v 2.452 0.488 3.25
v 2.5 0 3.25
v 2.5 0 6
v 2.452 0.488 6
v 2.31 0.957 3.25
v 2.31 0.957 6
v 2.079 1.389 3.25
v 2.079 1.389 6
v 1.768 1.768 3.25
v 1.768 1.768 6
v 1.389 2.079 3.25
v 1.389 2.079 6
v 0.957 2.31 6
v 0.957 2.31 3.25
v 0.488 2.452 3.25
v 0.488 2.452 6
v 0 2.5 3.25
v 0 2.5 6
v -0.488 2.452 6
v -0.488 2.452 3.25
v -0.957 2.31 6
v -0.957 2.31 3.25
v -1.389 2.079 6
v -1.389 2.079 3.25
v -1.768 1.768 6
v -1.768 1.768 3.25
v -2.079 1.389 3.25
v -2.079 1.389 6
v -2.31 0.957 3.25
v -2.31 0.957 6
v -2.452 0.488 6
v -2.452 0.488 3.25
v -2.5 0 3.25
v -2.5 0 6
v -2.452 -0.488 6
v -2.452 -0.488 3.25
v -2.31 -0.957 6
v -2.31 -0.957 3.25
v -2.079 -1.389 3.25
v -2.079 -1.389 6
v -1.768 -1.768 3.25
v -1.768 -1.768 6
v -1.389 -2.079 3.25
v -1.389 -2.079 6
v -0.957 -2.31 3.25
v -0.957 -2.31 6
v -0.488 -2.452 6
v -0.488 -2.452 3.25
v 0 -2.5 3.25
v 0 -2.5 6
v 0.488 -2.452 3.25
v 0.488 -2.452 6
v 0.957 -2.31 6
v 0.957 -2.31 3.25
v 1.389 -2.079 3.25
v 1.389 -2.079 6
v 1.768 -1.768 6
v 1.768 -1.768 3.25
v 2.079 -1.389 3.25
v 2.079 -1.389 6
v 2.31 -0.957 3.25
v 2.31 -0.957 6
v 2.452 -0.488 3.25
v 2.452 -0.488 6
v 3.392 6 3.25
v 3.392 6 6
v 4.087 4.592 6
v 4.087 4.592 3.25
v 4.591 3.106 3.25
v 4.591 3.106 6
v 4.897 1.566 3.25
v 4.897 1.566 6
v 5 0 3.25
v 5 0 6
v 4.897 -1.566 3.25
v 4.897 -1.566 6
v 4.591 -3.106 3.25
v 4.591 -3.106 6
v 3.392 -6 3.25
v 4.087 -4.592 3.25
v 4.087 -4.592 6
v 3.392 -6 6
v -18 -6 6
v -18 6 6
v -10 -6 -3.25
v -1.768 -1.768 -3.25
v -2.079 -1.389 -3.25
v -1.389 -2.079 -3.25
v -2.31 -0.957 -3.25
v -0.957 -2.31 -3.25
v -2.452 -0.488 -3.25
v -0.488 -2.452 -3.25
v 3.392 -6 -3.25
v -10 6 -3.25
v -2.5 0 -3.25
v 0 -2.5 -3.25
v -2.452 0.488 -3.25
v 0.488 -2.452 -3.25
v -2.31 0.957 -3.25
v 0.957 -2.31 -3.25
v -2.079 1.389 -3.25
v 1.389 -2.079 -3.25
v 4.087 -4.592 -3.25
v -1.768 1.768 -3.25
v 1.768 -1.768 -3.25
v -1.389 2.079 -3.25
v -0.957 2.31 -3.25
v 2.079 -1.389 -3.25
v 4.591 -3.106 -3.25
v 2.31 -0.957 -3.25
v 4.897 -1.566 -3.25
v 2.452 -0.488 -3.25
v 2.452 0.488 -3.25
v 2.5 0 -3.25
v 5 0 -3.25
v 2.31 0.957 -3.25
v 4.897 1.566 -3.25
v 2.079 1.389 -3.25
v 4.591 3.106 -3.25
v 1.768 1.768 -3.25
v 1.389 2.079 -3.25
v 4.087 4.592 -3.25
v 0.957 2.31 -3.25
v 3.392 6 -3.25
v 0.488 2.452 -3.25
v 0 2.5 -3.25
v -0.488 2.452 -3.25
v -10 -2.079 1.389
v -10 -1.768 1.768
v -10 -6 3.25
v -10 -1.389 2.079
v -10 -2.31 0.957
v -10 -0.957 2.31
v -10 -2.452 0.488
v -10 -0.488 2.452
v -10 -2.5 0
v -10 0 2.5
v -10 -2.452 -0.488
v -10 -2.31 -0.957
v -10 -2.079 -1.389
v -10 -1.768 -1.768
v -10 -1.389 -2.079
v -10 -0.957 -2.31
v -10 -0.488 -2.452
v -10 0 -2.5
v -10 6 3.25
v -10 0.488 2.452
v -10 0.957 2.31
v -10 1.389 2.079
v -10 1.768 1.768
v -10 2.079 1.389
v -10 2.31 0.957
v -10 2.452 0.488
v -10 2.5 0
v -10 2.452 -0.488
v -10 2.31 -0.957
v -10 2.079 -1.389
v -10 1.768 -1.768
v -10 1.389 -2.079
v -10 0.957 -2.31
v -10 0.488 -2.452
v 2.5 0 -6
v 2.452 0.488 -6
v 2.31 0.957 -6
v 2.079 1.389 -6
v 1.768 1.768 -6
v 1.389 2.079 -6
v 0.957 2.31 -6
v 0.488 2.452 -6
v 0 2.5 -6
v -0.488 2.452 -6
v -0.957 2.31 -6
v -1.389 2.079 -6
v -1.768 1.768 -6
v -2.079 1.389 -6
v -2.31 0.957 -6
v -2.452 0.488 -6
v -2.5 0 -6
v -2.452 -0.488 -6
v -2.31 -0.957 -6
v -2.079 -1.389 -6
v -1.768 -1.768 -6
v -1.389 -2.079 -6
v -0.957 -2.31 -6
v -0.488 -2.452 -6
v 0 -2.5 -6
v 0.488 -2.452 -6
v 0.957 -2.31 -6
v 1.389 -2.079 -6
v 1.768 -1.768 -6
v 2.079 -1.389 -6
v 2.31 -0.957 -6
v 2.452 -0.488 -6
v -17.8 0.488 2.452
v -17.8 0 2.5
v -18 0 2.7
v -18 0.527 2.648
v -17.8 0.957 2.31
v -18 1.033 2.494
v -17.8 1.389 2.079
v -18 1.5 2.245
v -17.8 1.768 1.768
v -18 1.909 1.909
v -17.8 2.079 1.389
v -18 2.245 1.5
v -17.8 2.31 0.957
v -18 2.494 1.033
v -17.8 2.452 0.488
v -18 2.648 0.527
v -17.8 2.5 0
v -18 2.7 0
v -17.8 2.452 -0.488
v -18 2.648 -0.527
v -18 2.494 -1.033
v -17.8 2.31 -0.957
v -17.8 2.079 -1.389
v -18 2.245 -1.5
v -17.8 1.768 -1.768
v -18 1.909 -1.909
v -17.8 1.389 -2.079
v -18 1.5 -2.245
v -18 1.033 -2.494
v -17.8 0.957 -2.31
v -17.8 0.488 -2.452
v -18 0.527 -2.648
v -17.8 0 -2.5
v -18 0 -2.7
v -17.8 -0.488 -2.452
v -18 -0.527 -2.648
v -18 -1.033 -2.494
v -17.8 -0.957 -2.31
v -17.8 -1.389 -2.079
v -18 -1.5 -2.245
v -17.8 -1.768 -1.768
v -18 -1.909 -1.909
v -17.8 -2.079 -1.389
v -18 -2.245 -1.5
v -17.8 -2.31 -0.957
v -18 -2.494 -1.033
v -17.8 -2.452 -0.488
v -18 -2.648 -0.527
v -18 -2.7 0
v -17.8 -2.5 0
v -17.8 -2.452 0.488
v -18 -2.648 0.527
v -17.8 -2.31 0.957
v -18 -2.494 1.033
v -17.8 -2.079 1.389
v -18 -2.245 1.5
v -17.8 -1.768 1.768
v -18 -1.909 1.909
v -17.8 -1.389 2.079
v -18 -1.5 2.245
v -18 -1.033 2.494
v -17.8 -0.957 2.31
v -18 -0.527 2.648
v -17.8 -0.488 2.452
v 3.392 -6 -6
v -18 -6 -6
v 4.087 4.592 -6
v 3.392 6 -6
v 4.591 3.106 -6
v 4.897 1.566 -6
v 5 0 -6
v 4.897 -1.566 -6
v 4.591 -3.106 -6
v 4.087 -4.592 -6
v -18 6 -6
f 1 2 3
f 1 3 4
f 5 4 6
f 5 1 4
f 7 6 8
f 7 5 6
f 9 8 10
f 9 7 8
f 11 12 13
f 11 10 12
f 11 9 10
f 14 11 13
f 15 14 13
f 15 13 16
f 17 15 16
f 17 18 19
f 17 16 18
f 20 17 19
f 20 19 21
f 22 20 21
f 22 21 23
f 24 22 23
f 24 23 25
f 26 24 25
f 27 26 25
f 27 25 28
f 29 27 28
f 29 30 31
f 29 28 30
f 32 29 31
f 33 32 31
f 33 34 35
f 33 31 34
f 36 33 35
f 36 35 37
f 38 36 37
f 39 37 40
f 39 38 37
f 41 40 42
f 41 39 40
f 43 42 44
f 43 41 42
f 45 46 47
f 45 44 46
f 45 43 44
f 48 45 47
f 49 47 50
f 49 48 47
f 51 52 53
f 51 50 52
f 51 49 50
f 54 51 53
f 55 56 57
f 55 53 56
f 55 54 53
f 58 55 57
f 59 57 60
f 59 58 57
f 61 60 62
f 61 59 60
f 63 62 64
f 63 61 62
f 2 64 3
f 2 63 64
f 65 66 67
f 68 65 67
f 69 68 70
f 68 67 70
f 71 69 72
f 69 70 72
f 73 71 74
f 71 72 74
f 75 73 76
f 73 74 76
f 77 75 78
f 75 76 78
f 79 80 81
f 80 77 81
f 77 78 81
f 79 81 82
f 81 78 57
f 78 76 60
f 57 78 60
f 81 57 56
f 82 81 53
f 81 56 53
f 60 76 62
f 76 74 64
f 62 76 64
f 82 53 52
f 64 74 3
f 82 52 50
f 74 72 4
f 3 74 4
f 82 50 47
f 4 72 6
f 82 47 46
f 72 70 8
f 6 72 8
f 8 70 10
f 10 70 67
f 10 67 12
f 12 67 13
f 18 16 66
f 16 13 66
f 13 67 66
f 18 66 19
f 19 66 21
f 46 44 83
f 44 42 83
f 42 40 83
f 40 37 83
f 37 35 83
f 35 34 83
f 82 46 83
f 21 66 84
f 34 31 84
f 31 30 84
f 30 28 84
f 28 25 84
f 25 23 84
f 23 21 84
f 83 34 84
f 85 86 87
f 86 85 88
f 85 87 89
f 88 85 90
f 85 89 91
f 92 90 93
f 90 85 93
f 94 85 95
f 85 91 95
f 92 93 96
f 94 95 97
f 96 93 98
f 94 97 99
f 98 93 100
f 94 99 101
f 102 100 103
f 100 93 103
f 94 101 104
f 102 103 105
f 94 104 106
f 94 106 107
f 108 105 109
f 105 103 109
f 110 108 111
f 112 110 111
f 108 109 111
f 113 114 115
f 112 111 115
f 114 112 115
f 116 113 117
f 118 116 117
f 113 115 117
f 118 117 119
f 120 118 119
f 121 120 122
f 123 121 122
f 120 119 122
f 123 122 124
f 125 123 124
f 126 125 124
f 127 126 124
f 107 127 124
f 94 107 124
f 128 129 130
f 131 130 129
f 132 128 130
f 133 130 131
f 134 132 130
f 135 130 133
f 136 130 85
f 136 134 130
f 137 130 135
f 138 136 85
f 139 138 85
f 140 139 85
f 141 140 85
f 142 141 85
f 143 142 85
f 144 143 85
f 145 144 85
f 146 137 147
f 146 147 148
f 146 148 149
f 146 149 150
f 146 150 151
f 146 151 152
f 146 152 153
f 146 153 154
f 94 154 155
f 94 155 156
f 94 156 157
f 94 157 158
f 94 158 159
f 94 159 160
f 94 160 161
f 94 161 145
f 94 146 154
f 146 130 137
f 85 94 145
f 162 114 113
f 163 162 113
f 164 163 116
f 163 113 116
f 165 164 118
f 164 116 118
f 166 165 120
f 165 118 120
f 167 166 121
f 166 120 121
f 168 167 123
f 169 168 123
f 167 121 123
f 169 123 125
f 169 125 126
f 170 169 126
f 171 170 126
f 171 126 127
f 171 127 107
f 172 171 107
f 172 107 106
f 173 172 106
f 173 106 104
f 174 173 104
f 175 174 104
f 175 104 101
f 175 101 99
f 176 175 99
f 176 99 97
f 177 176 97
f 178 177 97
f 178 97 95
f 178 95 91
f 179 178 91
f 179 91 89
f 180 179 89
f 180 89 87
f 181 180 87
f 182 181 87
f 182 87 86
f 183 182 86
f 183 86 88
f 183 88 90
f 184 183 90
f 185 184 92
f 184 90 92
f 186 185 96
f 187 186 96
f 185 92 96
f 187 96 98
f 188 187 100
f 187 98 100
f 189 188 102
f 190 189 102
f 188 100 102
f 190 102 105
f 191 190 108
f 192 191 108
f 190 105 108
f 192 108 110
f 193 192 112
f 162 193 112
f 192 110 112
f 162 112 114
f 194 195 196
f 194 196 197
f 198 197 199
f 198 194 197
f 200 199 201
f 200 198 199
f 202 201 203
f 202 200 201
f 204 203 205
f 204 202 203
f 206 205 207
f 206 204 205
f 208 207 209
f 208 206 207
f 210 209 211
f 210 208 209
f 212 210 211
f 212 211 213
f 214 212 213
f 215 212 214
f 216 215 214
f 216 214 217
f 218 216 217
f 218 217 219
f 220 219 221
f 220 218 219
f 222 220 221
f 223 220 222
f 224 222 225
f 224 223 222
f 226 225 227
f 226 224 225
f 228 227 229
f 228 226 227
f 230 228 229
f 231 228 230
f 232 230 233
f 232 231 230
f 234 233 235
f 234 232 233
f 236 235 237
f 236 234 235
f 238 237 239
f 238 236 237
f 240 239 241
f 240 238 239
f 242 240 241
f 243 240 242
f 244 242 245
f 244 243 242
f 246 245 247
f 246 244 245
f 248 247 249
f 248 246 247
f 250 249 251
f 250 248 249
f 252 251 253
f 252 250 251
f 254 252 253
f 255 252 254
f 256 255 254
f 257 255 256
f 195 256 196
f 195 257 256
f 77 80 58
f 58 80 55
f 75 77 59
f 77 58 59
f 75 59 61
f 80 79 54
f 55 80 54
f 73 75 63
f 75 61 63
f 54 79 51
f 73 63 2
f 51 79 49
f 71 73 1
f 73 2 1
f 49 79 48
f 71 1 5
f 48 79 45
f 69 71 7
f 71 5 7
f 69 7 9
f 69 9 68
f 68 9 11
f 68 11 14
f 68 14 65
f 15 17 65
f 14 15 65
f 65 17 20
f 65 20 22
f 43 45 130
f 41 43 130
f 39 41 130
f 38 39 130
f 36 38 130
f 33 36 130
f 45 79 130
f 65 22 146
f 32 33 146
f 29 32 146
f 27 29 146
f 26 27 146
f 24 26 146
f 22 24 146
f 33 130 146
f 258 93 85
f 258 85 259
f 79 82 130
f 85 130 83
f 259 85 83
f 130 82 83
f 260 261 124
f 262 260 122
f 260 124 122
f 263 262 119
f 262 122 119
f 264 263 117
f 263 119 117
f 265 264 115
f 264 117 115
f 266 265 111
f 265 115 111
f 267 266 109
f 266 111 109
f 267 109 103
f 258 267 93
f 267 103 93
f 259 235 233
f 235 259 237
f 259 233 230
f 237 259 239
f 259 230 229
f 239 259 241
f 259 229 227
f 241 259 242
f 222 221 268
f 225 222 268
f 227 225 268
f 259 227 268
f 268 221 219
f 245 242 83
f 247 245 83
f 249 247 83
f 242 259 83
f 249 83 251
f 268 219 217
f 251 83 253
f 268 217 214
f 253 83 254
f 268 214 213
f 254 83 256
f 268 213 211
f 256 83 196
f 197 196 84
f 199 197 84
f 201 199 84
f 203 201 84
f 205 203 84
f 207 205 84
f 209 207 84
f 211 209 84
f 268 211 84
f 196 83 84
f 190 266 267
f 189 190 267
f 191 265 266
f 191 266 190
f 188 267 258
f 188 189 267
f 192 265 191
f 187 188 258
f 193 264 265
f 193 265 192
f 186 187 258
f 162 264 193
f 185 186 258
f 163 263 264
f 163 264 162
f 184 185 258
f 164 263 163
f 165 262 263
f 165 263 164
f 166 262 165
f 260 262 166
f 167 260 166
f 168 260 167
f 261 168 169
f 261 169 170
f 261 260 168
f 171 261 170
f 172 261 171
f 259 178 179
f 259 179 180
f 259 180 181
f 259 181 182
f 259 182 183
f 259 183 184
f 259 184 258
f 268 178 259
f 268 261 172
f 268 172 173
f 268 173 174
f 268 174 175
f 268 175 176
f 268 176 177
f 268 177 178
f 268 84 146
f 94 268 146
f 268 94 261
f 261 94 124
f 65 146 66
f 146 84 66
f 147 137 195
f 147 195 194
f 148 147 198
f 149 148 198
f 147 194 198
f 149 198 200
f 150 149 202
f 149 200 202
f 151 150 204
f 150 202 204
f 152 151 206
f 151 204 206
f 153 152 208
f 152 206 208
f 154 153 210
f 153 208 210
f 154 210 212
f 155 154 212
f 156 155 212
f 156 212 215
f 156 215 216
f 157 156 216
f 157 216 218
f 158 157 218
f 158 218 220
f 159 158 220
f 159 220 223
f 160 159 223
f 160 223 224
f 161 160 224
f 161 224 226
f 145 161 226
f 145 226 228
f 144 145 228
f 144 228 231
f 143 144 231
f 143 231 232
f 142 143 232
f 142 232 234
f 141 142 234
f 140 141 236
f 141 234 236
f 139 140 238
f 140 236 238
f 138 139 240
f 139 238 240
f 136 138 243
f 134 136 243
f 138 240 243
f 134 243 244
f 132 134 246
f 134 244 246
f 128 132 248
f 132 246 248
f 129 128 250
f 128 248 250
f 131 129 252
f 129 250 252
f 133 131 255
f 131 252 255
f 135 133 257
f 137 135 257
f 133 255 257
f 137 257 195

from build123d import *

# Parameters (mm, degrees)
BASE_EXTRUDE_DEPTH      = 6
SKETCH5_W               = 6.5
SKETCH5_H               = 12
CUT_EXTRUDE3_DEPTH      = 6
CUT_EXTRUDE3_DEPTH_BACK = 10
SKETCH7_R               = 2.5
CUT_EXTRUDE4_DEPTH      = 11
CHAMFER2_SIZE           = 0.2
SKETCH6_R               = 2.5
CUT_EXTRUDE5_DEPTH      = 7
CUT_EXTRUDE5_DEPTH_BACK = 7


with BuildPart() as part:
    # Sketch2 → Base-Extrude (new body, symmetric)
    with BuildSketch(Plane.XY):
        with BuildLine():
            Line((-18, 6), (3.392304845, 6))
            ThreePointArc((3.392304845, 6), (5, 0), (3.392304845, -6))
            Line((3.392304845, -6), (-18, -6))
            Line((-18, -6), (-18, 6))
        make_face()
    extrude(amount=BASE_EXTRUDE_DEPTH, both=True)

    # Sketch5 → Cut-Extrude3 (cut, two sides)
    with BuildSketch(Plane(origin=(0, 0, 0), x_dir=(0, 0, -1), z_dir=(1, 0, 0))) as cut_extrude3_sk:
        Rectangle(SKETCH5_W, SKETCH5_H)
    extrude(amount=CUT_EXTRUDE3_DEPTH, mode=Mode.SUBTRACT)
    extrude(cut_extrude3_sk.sketch, amount=-CUT_EXTRUDE3_DEPTH_BACK, mode=Mode.SUBTRACT)

    # Sketch7 → Cut-Extrude4 (cut)
    with BuildSketch(Plane.ZY.offset(18)):
        Circle(SKETCH7_R)
    extrude(amount=-CUT_EXTRUDE4_DEPTH, mode=Mode.SUBTRACT)

    # Chamfer2
    chamfer2_edges = [part.edges().sort_by_distance(p)[0] for p in [
        (-18, 0, -2.5),
    ]]
    chamfer(chamfer2_edges, length=CHAMFER2_SIZE)

    # Sketch6 → Cut-Extrude5 (cut, two sides)
    with BuildSketch(Plane.XY) as cut_extrude5_sk:
        Circle(SKETCH6_R)
    extrude(amount=CUT_EXTRUDE5_DEPTH, mode=Mode.SUBTRACT)
    extrude(cut_extrude5_sk.sketch, amount=-CUT_EXTRUDE5_DEPTH_BACK, mode=Mode.SUBTRACT)


solid = part.part
